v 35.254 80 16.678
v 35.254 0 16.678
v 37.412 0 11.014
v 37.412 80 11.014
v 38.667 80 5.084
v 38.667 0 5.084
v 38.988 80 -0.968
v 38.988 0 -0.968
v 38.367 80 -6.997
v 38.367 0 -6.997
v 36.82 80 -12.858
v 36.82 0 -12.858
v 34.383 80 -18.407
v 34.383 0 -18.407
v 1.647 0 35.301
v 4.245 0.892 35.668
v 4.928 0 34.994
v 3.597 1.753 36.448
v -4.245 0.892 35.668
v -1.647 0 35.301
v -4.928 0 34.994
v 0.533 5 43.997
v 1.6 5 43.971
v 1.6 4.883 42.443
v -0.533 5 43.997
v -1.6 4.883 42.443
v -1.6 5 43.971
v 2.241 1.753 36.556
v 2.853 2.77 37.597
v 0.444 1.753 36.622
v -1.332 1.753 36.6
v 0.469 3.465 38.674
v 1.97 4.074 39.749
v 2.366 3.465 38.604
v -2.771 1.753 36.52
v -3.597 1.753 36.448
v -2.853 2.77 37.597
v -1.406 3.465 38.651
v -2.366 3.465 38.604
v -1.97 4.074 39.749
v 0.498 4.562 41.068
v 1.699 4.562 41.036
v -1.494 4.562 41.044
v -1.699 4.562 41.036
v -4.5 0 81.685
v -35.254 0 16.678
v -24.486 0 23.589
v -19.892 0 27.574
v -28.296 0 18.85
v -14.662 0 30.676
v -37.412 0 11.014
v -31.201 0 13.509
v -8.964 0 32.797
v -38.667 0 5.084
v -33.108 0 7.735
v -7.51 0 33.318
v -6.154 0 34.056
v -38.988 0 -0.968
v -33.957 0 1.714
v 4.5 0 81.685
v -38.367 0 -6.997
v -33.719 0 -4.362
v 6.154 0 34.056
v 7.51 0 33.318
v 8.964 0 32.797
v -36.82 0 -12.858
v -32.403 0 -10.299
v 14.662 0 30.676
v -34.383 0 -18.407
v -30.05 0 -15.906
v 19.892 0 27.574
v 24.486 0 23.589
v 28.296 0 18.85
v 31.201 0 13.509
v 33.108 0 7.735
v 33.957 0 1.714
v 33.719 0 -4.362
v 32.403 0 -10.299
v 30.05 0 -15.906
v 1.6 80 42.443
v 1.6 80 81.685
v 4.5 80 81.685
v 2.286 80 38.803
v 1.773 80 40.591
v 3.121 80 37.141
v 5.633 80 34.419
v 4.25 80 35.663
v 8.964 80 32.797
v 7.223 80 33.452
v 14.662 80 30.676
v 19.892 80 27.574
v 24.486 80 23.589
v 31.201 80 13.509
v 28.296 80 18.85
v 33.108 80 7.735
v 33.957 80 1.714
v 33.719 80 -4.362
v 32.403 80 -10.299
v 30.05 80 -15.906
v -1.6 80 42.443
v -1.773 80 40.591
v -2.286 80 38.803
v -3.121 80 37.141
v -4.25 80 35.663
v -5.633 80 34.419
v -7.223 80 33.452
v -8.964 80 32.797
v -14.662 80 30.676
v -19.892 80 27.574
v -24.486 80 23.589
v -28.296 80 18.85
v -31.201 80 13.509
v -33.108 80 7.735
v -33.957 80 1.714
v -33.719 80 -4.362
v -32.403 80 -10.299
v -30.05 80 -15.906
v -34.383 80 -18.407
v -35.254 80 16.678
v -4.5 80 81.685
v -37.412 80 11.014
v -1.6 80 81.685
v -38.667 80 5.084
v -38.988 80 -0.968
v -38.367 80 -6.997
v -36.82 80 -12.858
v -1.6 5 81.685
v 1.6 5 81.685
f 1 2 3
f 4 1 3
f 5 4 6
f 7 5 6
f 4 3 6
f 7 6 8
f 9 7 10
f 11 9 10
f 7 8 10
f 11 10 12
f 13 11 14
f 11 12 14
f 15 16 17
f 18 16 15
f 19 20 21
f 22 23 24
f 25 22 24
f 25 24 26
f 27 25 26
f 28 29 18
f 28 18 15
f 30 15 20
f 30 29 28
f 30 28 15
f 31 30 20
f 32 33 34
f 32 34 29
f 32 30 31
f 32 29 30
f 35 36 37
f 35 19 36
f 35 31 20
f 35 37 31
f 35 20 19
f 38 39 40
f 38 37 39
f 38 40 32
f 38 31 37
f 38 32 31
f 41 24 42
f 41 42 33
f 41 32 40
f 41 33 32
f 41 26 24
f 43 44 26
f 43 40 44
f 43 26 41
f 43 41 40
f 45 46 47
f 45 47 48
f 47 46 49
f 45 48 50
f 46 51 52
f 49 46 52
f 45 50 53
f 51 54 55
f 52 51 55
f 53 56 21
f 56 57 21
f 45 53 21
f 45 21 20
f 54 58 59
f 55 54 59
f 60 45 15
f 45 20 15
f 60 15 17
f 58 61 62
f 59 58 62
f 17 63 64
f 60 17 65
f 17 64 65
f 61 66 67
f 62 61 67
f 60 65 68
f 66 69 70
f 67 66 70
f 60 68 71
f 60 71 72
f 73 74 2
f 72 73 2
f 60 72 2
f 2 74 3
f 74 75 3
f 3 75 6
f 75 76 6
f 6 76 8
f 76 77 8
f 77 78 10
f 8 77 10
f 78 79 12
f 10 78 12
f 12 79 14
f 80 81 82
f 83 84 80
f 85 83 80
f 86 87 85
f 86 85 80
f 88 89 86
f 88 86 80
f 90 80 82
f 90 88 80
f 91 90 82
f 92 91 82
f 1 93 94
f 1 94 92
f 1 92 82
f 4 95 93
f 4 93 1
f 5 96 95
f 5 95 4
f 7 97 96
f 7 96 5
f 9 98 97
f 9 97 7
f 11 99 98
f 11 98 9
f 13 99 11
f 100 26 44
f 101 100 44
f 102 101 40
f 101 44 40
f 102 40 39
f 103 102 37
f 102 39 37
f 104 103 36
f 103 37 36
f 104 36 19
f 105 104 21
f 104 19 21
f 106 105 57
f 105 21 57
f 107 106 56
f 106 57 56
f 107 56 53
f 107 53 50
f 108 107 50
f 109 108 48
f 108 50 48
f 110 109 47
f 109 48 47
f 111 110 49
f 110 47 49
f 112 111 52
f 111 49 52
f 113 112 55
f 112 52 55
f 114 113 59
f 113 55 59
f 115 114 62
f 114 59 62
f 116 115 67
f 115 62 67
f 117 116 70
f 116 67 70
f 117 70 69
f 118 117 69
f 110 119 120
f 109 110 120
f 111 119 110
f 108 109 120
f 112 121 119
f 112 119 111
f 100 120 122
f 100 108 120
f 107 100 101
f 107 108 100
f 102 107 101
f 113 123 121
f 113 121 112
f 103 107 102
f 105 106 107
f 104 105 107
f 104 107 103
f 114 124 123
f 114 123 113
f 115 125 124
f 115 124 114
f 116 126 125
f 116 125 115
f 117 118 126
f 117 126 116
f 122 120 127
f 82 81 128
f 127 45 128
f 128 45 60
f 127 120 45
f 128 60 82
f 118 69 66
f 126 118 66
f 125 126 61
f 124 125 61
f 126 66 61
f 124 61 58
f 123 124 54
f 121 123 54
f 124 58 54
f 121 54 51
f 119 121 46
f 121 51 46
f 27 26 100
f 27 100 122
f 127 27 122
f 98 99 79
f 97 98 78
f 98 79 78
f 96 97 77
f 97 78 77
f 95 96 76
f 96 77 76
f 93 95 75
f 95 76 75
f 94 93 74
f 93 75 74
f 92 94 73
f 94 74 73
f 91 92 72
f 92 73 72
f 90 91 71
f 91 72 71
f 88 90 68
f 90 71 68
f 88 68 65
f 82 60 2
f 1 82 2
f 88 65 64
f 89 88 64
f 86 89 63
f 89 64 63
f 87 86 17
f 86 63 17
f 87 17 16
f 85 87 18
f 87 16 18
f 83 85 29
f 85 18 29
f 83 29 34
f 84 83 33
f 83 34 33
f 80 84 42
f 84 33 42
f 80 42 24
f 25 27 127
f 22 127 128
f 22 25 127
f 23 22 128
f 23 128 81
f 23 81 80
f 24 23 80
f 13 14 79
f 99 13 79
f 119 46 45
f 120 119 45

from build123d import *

# Parameters (mm, degrees)
FIN_SLOT_EXTRUDE_DEPTH = 80
FIN_START              = -75
FIN_SLOT_DEPTH         = 75
FILLET1_R              = 10


with BuildPart() as part:
    # Sketch2 → Fin slot extrude (new body)
    with BuildSketch(Plane(origin=(0, 0, 0), x_dir=(1, 0, 0), z_dir=(0, 1, 0))):
        with BuildLine():
            Line((-35.253910446, -16.678183302), (-4.5, -81.685))
            Line((-4.5, -81.685), (4.5, -81.685))
            Line((4.5, -81.685), (35.253910446, -16.678183302))
            ThreePointArc((35.253910446, -16.678183302), (38.987980591, 0.968178408), (34.382638025, 18.407449646))
            Line((34.382638025, 18.407449646), (30.049957519, 15.90597539))
            ThreePointArc((30.049957519, 15.90597539), (0, -34), (-30.049957519, 15.90597539))
            Line((-30.049957519, 15.90597539), (-34.382638025, 18.407449646))
            ThreePointArc((-34.382638025, 18.407449646), (-38.987980591, 0.968178408), (-35.253910446, -16.678183302))
        make_face()
    extrude(amount=FIN_SLOT_EXTRUDE_DEPTH)

    # Sketch3 → Fin slot (cut)
    with BuildSketch(Plane(origin=(0, 80, 0), x_dir=(1, 0, 0), z_dir=(0, 1, 0)).offset(FIN_START)):
        with BuildLine():
            Line((1.6, -81.685), (1.6, -33.962332075))
            ThreePointArc((1.6, -33.962332075), (0, -34), (-1.6, -33.962332075))
            Line((-1.6, -33.962332075), (-1.6, -81.685))
            Line((-1.6, -81.685), (1.6, -81.685))
        make_face()
    extrude(amount=FIN_SLOT_DEPTH, mode=Mode.SUBTRACT)

    # Fillet1
    # the kernel refuses this fillet: 10 mm, written as the material it takes off along each edge
    with BuildSketch(Plane(origin=(-1.6, 5, 33.962332075), x_dir=(0, 0, 1), z_dir=(0, 1, 0))) as fillet1_piece_1:
        with BuildLine():
            CenterArc((8.481041966, -10), FILLET1_R, 90, 74.714058958)
            Line((-1.165179407, -7.363636364), (-1.358103835, -7.310909091))
            ThreePointArc((-1.358103835, -7.310909091), (-0.577691759, -3.682593204), (-0.199778424, 0.009411765))
            Line((-0.199778424, 0.009411765), (0, 0.2))
            Line((0, 0.2), (8.481041966, 0.2))
            Line((8.481041966, 0.2), (8.481041966, 0))
        make_face()
    extrude(amount=75, mode=Mode.SUBTRACT)
    with BuildSketch(Plane(origin=(1.6, 5, 33.962332075), x_dir=(0, 0, 1), z_dir=(0, 1, 0))) as fillet1_piece_2:
        with BuildLine():
            CenterArc((8.481041966, 10), FILLET1_R, 195.285941042, 74.714058958)
            Line((-1.165179407, 7.363636364), (-1.358103835, 7.310909091))
            ThreePointArc((-1.358103835, 7.310909091), (-0.577691759, 3.682593204), (-0.199778424, -0.009411765))
            Line((-0.199778424, -0.009411765), (0, -0.2))
            Line((0, -0.2), (8.481041966, -0.2))
            Line((8.481041966, -0.2), (8.481041966, 0))
        make_face()
    extrude(amount=75, mode=Mode.SUBTRACT)
    with BuildSketch(Plane(origin=(0, 5, 0), x_dir=(0.7049632922211216, 0, 0.7092437920918008), z_dir=(0.7092437920918008, 0, -0.7049632922211216))) as fillet1_piece_3_section:
        with BuildLine():
            CenterArc((34 + FILLET1_R, FILLET1_R), FILLET1_R, 180, 90)
            Line((34, FILLET1_R), (34 - FILLET1_R * 0.02, FILLET1_R))
            Line((34 - FILLET1_R * 0.02, FILLET1_R), (34 - FILLET1_R * 0.02, -FILLET1_R * 0.02))
            Line((34 - FILLET1_R * 0.02, -FILLET1_R * 0.02), (34 + FILLET1_R, -FILLET1_R * 0.02))
            Line((34 + FILLET1_R, -FILLET1_R * 0.02), (34 + FILLET1_R, 0))
        make_face()
    fillet1_piece_3 = revolve(axis=Axis((0, 5, 0), (0, -1, 0)), revolution_arc=89.653157122, mode=Mode.PRIVATE)
    fillet1_piece_3 = split(fillet1_piece_3, bisect_by=Plane(origin=(1.6, 2.736001805, 36.252063161), z_dir=(-1, 0, 0)), keep=Keep.TOP, mode=Mode.PRIVATE)
    fillet1_piece_3 = split(fillet1_piece_3, bisect_by=Plane(origin=(-1.6, 2.736001805, 36.252063161), z_dir=(1, 0, 0)), keep=Keep.TOP, mode=Mode.PRIVATE)
    add(fillet1_piece_3, mode=Mode.SUBTRACT)
    with BuildSketch(Plane(origin=(0, 5, 0), x_dir=(0.7049632922211216, 0, 0.7092437920918008), z_dir=(0.7092437920918008, 0, -0.7049632922211216))) as fillet1_piece_4a_section:
        with BuildLine():
            CenterArc((34 + FILLET1_R, FILLET1_R), FILLET1_R, 180, 90)
            Line((34, FILLET1_R), (34 - FILLET1_R * 0.02, FILLET1_R))
            Line((34 - FILLET1_R * 0.02, FILLET1_R), (34 - FILLET1_R * 0.02, -FILLET1_R * 0.02))
            Line((34 - FILLET1_R * 0.02, -FILLET1_R * 0.02), (34 + FILLET1_R, -FILLET1_R * 0.02))
            Line((34 + FILLET1_R, -FILLET1_R * 0.02), (34 + FILLET1_R, 0))
        make_face()
    fillet1_piece_4a = revolve(axis=Axis((0, 5, 0), (0, -1, 0)), revolution_arc=89.653157122, mode=Mode.PRIVATE)
    fillet1_piece_4a = split(fillet1_piece_4a, bisect_by=Plane(origin=(-1.6, 2.81629174, 32.584573329), z_dir=(-1, 0, 0)), keep=Keep.TOP, mode=Mode.PRIVATE)
    with BuildSketch(Plane(origin=(-1.6, -16.202604914, 33.962332075), x_dir=(0, 0, 1), z_dir=(0, 1, 0))) as fillet1_piece_4b_section:
        with BuildLine():
            CenterArc((8.481041966, -10), FILLET1_R, 90, 74.714058958)
            Line((-1.165179407, -7.363636364), (-1.358103835, -7.310909091))
            ThreePointArc((-1.358103835, -7.310909091), (-0.577691759, -3.682593204), (-0.199778424, 0.009411765))
            Line((-0.199778424, 0.009411765), (0, 0.2))
            Line((0, 0.2), (8.481041966, 0.2))
            Line((8.481041966, 0.2), (8.481041966, 0))
        make_face()
    fillet1_piece_4b = extrude(amount=96.202604914, mode=Mode.PRIVATE)
    fillet1_piece_4b = split(fillet1_piece_4b, bisect_by=Plane(origin=(-3.235617235, 5, 35.755925785), z_dir=(0, -1, 0)), keep=Keep.TOP, mode=Mode.PRIVATE)
    fillet1_piece_4 = fillet1_piece_4a & fillet1_piece_4b
    add(fillet1_piece_4, mode=Mode.SUBTRACT)
    with BuildSketch(Plane(origin=(1.6, -16.202604914, 33.962332075), x_dir=(0, 0, 1), z_dir=(0, 1, 0))) as fillet1_piece_5a_section:
        with BuildLine():
            CenterArc((8.481041966, 10), FILLET1_R, 195.285941042, 74.714058958)
            Line((-1.165179407, 7.363636364), (-1.358103835, 7.310909091))
            ThreePointArc((-1.358103835, 7.310909091), (-0.577691759, 3.682593204), (-0.199778424, -0.009411765))
            Line((-0.199778424, -0.009411765), (0, -0.2))
            Line((0, -0.2), (8.481041966, -0.2))
            Line((8.481041966, -0.2), (8.481041966, 0))
        make_face()
    fillet1_piece_5a = extrude(amount=96.202604914, mode=Mode.PRIVATE)
    fillet1_piece_5a = split(fillet1_piece_5a, bisect_by=Plane(origin=(3.235617235, 5, 35.755925785), z_dir=(0, -1, 0)), keep=Keep.TOP, mode=Mode.PRIVATE)
    with BuildSketch(Plane(origin=(0, 5, 0), x_dir=(0.7049632922211216, 0, 0.7092437920918008), z_dir=(0.7092437920918008, 0, -0.7049632922211216))) as fillet1_piece_5b_section:
        with BuildLine():
            CenterArc((34 + FILLET1_R, FILLET1_R), FILLET1_R, 180, 90)
            Line((34, FILLET1_R), (34 - FILLET1_R * 0.02, FILLET1_R))
            Line((34 - FILLET1_R * 0.02, FILLET1_R), (34 - FILLET1_R * 0.02, -FILLET1_R * 0.02))
            Line((34 - FILLET1_R * 0.02, -FILLET1_R * 0.02), (34 + FILLET1_R, -FILLET1_R * 0.02))
            Line((34 + FILLET1_R, -FILLET1_R * 0.02), (34 + FILLET1_R, 0))
        make_face()
    fillet1_piece_5b = revolve(axis=Axis((0, 5, 0), (0, -1, 0)), revolution_arc=89.653157122, mode=Mode.PRIVATE)
    fillet1_piece_5b = split(fillet1_piece_5b, bisect_by=Plane(origin=(1.6, 2.816291902, 32.584573464), z_dir=(1, 0, 0)), keep=Keep.TOP, mode=Mode.PRIVATE)
    fillet1_piece_5 = fillet1_piece_5a & fillet1_piece_5b
    add(fillet1_piece_5, mode=Mode.SUBTRACT)


solid = part.part
